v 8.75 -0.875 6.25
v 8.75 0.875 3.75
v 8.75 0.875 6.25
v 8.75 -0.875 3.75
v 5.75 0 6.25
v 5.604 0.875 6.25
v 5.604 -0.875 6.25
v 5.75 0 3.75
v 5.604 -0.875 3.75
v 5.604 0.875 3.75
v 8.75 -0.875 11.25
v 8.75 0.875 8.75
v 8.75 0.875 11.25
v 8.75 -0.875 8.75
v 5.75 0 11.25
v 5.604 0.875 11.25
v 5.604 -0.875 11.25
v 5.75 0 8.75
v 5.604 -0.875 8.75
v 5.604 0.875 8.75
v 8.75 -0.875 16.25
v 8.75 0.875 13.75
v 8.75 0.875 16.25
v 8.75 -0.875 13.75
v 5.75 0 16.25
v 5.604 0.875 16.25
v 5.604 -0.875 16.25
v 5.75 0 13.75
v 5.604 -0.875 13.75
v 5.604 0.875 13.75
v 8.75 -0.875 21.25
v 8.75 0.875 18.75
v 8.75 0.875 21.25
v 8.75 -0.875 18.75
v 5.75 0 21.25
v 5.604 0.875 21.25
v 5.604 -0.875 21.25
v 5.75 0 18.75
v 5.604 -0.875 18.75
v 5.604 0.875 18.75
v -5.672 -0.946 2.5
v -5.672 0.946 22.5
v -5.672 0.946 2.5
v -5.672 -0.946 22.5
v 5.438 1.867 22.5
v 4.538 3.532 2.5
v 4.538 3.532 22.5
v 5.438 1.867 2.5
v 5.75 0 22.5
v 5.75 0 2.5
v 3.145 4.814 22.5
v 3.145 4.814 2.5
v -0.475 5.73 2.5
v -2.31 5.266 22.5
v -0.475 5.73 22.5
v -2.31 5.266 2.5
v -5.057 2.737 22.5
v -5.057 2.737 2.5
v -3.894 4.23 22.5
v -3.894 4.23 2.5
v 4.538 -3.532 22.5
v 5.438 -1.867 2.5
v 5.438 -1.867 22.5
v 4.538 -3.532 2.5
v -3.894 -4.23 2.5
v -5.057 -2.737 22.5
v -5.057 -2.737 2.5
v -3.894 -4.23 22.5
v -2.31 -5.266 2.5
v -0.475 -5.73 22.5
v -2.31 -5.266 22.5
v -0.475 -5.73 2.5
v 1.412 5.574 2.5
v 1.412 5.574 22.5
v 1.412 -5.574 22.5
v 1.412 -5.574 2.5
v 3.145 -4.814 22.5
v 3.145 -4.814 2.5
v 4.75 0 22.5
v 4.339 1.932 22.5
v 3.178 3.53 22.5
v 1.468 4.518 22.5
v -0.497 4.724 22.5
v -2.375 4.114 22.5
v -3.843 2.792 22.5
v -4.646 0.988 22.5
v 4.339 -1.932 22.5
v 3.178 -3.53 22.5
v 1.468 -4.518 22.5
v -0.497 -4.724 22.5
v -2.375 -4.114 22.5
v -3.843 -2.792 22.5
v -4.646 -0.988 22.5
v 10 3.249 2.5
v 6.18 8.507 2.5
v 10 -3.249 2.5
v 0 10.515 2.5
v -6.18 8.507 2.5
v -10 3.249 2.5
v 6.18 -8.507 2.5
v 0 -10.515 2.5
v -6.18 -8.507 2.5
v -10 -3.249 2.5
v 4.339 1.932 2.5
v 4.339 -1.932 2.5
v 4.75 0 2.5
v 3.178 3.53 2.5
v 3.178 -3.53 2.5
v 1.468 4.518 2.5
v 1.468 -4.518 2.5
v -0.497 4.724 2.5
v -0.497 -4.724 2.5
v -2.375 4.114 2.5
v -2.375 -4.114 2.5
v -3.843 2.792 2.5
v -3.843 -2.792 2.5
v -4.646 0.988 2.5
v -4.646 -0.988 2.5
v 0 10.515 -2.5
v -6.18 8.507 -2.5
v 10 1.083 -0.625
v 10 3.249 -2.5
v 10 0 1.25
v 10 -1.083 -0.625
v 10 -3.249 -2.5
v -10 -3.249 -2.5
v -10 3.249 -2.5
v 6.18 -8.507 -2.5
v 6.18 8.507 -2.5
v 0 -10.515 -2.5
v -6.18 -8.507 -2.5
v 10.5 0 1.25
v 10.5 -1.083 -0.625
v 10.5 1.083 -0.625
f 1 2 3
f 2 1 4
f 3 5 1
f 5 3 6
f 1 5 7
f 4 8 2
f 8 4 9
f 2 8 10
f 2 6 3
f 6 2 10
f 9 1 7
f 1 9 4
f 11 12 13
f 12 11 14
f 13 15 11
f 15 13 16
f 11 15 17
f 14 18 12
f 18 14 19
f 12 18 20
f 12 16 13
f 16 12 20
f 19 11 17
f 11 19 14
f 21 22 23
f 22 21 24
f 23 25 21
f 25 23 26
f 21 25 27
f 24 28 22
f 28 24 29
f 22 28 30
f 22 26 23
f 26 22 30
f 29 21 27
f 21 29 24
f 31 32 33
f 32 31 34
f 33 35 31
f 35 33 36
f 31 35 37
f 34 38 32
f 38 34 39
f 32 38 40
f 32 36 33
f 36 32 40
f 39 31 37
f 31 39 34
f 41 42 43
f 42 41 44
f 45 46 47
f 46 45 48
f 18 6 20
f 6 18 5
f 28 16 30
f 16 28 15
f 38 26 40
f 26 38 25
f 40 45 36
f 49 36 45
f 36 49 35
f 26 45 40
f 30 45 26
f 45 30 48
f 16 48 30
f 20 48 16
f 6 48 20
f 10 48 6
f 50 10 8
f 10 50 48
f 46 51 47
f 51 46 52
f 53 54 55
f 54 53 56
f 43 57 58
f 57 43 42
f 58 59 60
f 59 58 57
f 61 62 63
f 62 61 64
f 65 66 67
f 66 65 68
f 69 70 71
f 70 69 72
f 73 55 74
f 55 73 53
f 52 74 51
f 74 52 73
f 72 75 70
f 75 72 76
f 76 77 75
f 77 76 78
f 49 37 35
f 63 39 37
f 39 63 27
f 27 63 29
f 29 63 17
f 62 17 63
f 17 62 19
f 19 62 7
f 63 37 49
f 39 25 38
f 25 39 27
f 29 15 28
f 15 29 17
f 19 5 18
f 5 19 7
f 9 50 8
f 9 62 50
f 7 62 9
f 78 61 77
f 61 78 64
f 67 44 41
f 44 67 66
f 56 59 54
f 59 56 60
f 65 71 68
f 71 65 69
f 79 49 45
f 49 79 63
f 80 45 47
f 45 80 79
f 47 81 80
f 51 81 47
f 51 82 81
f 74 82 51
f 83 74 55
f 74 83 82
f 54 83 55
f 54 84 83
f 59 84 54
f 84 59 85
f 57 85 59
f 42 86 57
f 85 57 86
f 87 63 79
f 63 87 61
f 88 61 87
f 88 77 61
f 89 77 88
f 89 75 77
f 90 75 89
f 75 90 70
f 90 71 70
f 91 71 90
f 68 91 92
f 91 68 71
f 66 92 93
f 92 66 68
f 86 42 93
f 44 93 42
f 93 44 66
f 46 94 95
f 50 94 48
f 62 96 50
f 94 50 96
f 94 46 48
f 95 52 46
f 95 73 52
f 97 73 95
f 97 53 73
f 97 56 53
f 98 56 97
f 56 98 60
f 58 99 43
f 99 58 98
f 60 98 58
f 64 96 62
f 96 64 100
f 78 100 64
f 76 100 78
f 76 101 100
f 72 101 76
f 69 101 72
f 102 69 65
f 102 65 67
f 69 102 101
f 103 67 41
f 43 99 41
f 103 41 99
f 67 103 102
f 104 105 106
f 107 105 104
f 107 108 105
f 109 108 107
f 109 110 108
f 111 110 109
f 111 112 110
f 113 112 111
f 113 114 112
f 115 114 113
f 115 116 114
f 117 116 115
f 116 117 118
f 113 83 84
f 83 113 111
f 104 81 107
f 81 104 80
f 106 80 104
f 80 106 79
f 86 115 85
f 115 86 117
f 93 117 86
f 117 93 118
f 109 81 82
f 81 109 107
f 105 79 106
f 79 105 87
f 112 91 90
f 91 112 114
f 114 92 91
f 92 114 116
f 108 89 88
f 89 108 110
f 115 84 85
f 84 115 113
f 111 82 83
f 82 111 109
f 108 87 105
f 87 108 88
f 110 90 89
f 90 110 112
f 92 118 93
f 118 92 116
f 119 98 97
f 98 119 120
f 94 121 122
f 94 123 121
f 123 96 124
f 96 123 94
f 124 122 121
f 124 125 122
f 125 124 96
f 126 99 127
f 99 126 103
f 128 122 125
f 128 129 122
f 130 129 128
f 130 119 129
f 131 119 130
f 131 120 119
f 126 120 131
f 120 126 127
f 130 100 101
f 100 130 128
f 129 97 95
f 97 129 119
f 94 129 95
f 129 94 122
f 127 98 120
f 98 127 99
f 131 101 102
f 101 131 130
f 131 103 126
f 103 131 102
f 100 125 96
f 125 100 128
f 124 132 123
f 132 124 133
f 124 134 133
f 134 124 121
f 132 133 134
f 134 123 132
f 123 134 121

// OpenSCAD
// file: sharedgeometry.scad
// Cryptex Shared Geometries


// polygonal-based prism defition
module ngonPrism(n, r, h) {
    linear_extrude(height = h, center=true) 
        polygon([
            for (i=[0:n-1], a=(i+1/2)*360/n) 
                [ r*cos(a)/cos(180/n), r*sin(a)/cos(180/n) ]
        ]);
}
// main file
// Cryptex Shaft Model


// Shared geometries
// for polygonal-based prism defition
use <sharedgeometry.scad>


module cryptexShaft(n, digits, inner_radius, width, thickness, clearance){
    // bBase
    ngonPrism(n, outer_radius, width);
    // Alignment Indicator
    translate([outer_radius,0,0])
        rotate([90,90,90]) 
            ngonPrism(3, width/8, thickness);
    // Shaft
    translate([0,0,(digits+1)*width/2]){
        difference(){
            union(){
                // Body
                cylinder(h=digits*width, r=inner_radius-thickness-clearance, center=true);
                // Nodes
                for (i=[0:digits-1], h=(i+1/2-digits/2)*width) 
                    translate([inner_radius,0,h]) 
                        cube([2*(outer_radius-inner_radius-thickness-clearance), 2*thickness-clearance, width-2*(thickness+clearance)], center=true);
            };
            // Hollow center
            cylinder(h=digits*width, r=inner_radius-2*thickness-clearance, center=true);
        };
    }
}




// Main Model
n = 10;
digits = 4;

inner_radius = 7;
outer_radius = 10;
width = 5;
thickness = 1;

clearance = 0.25;

face = 2*tan(180/n)*outer_radius;
echo(face);

cryptexShaft(n, digits, inner_radius, width, thickness, clearance);
